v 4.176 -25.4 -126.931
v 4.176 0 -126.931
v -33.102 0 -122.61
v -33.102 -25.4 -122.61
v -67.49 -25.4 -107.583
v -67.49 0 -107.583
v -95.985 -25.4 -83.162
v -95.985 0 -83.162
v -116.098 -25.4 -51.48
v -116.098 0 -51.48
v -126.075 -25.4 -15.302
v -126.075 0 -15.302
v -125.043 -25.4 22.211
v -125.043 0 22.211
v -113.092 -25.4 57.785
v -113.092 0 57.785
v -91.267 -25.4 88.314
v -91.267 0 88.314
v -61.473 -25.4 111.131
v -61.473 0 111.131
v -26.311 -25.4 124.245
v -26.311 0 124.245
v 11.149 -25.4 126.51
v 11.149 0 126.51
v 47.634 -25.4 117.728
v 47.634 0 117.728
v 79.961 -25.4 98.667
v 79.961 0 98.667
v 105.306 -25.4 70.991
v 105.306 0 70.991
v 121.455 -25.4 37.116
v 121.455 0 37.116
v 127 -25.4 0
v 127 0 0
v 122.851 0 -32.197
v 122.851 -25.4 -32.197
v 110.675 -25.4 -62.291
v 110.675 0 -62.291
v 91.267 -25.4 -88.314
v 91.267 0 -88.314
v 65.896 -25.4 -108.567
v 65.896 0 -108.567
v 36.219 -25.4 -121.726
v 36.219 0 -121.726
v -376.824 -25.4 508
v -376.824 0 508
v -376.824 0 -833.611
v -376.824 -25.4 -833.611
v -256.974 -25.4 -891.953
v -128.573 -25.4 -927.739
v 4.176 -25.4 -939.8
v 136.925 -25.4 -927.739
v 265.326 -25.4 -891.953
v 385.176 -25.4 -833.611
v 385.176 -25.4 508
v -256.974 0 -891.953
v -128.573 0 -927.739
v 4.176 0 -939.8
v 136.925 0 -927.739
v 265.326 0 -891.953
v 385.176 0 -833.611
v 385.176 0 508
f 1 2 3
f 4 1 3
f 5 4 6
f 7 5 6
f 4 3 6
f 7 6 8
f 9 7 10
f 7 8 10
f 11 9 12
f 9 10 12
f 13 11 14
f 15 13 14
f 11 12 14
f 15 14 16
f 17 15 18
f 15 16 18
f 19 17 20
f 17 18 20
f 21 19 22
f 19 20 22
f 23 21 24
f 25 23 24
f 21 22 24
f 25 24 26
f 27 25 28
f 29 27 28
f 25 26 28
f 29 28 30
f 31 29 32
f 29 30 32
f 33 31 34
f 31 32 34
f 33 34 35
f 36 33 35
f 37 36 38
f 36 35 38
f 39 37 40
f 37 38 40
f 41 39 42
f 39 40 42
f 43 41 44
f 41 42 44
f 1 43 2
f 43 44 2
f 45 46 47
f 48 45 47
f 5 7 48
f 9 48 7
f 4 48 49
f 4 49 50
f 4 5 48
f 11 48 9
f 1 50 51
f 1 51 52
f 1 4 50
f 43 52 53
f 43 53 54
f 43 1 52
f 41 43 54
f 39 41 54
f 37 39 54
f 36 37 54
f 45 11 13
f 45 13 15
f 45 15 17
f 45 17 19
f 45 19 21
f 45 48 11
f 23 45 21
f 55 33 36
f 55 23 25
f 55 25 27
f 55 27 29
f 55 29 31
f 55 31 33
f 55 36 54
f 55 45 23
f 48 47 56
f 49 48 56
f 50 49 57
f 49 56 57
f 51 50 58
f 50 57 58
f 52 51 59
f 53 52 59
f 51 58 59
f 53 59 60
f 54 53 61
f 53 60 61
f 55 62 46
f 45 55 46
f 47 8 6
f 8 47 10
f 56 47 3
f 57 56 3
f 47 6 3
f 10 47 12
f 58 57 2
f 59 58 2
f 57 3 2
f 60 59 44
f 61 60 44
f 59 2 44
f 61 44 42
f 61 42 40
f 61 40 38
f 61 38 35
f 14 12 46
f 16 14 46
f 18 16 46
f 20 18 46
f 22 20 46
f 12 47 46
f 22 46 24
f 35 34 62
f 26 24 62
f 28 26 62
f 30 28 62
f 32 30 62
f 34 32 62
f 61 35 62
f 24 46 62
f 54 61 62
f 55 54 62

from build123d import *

# Parameters (mm, degrees)
F1_DEPTH = 25.4


with BuildPart() as f1:
    # F0 (on Front) → F1 (new body)
    with BuildSketch(Plane.XZ):
        with BuildLine():
            Line((385.175922, -833.611421), (385.175922, 0))
            Line((385.175922, 0), (385.175922, 508))
            Line((385.175922, 508), (-376.824078, 508))
            Line((-376.824078, 508), (-376.824078, -833.611421))
            ThreePointArc((-376.824078, -833.611421), (4.175922, -939.8), (385.175922, -833.611421))
        make_face()
        with BuildLine():
            ThreePointArc((4.175922, -126.931327), (-91.267032, 88.313809), (127, 0))
            ThreePointArc((127, 0), (91.267032, -88.313809), (4.175922, -126.931327))
        make_face(mode=Mode.SUBTRACT)
    extrude(amount=F1_DEPTH)


solid = f1.part
